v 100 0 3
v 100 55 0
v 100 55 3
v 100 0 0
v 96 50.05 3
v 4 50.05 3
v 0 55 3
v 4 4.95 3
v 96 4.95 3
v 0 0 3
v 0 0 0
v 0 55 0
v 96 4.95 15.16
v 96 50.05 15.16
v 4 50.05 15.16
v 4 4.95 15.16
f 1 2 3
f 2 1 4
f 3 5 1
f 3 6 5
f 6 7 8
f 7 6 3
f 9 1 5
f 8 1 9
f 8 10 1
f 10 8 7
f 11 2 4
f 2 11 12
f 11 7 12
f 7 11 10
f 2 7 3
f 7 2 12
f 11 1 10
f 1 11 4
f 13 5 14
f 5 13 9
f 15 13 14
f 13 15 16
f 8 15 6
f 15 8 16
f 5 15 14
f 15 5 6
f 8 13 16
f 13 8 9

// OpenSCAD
union() {
	translate(v = [50.0, 27.5, 1.5]) {
		cube(center = true, size = [100.0, 55.0, 3.0]);
	}
	translate(v = [50.0, 27.5, 9.08]) {
		cube(center = true, size = [92.0, 45.1, 12.16]);
	}
}
